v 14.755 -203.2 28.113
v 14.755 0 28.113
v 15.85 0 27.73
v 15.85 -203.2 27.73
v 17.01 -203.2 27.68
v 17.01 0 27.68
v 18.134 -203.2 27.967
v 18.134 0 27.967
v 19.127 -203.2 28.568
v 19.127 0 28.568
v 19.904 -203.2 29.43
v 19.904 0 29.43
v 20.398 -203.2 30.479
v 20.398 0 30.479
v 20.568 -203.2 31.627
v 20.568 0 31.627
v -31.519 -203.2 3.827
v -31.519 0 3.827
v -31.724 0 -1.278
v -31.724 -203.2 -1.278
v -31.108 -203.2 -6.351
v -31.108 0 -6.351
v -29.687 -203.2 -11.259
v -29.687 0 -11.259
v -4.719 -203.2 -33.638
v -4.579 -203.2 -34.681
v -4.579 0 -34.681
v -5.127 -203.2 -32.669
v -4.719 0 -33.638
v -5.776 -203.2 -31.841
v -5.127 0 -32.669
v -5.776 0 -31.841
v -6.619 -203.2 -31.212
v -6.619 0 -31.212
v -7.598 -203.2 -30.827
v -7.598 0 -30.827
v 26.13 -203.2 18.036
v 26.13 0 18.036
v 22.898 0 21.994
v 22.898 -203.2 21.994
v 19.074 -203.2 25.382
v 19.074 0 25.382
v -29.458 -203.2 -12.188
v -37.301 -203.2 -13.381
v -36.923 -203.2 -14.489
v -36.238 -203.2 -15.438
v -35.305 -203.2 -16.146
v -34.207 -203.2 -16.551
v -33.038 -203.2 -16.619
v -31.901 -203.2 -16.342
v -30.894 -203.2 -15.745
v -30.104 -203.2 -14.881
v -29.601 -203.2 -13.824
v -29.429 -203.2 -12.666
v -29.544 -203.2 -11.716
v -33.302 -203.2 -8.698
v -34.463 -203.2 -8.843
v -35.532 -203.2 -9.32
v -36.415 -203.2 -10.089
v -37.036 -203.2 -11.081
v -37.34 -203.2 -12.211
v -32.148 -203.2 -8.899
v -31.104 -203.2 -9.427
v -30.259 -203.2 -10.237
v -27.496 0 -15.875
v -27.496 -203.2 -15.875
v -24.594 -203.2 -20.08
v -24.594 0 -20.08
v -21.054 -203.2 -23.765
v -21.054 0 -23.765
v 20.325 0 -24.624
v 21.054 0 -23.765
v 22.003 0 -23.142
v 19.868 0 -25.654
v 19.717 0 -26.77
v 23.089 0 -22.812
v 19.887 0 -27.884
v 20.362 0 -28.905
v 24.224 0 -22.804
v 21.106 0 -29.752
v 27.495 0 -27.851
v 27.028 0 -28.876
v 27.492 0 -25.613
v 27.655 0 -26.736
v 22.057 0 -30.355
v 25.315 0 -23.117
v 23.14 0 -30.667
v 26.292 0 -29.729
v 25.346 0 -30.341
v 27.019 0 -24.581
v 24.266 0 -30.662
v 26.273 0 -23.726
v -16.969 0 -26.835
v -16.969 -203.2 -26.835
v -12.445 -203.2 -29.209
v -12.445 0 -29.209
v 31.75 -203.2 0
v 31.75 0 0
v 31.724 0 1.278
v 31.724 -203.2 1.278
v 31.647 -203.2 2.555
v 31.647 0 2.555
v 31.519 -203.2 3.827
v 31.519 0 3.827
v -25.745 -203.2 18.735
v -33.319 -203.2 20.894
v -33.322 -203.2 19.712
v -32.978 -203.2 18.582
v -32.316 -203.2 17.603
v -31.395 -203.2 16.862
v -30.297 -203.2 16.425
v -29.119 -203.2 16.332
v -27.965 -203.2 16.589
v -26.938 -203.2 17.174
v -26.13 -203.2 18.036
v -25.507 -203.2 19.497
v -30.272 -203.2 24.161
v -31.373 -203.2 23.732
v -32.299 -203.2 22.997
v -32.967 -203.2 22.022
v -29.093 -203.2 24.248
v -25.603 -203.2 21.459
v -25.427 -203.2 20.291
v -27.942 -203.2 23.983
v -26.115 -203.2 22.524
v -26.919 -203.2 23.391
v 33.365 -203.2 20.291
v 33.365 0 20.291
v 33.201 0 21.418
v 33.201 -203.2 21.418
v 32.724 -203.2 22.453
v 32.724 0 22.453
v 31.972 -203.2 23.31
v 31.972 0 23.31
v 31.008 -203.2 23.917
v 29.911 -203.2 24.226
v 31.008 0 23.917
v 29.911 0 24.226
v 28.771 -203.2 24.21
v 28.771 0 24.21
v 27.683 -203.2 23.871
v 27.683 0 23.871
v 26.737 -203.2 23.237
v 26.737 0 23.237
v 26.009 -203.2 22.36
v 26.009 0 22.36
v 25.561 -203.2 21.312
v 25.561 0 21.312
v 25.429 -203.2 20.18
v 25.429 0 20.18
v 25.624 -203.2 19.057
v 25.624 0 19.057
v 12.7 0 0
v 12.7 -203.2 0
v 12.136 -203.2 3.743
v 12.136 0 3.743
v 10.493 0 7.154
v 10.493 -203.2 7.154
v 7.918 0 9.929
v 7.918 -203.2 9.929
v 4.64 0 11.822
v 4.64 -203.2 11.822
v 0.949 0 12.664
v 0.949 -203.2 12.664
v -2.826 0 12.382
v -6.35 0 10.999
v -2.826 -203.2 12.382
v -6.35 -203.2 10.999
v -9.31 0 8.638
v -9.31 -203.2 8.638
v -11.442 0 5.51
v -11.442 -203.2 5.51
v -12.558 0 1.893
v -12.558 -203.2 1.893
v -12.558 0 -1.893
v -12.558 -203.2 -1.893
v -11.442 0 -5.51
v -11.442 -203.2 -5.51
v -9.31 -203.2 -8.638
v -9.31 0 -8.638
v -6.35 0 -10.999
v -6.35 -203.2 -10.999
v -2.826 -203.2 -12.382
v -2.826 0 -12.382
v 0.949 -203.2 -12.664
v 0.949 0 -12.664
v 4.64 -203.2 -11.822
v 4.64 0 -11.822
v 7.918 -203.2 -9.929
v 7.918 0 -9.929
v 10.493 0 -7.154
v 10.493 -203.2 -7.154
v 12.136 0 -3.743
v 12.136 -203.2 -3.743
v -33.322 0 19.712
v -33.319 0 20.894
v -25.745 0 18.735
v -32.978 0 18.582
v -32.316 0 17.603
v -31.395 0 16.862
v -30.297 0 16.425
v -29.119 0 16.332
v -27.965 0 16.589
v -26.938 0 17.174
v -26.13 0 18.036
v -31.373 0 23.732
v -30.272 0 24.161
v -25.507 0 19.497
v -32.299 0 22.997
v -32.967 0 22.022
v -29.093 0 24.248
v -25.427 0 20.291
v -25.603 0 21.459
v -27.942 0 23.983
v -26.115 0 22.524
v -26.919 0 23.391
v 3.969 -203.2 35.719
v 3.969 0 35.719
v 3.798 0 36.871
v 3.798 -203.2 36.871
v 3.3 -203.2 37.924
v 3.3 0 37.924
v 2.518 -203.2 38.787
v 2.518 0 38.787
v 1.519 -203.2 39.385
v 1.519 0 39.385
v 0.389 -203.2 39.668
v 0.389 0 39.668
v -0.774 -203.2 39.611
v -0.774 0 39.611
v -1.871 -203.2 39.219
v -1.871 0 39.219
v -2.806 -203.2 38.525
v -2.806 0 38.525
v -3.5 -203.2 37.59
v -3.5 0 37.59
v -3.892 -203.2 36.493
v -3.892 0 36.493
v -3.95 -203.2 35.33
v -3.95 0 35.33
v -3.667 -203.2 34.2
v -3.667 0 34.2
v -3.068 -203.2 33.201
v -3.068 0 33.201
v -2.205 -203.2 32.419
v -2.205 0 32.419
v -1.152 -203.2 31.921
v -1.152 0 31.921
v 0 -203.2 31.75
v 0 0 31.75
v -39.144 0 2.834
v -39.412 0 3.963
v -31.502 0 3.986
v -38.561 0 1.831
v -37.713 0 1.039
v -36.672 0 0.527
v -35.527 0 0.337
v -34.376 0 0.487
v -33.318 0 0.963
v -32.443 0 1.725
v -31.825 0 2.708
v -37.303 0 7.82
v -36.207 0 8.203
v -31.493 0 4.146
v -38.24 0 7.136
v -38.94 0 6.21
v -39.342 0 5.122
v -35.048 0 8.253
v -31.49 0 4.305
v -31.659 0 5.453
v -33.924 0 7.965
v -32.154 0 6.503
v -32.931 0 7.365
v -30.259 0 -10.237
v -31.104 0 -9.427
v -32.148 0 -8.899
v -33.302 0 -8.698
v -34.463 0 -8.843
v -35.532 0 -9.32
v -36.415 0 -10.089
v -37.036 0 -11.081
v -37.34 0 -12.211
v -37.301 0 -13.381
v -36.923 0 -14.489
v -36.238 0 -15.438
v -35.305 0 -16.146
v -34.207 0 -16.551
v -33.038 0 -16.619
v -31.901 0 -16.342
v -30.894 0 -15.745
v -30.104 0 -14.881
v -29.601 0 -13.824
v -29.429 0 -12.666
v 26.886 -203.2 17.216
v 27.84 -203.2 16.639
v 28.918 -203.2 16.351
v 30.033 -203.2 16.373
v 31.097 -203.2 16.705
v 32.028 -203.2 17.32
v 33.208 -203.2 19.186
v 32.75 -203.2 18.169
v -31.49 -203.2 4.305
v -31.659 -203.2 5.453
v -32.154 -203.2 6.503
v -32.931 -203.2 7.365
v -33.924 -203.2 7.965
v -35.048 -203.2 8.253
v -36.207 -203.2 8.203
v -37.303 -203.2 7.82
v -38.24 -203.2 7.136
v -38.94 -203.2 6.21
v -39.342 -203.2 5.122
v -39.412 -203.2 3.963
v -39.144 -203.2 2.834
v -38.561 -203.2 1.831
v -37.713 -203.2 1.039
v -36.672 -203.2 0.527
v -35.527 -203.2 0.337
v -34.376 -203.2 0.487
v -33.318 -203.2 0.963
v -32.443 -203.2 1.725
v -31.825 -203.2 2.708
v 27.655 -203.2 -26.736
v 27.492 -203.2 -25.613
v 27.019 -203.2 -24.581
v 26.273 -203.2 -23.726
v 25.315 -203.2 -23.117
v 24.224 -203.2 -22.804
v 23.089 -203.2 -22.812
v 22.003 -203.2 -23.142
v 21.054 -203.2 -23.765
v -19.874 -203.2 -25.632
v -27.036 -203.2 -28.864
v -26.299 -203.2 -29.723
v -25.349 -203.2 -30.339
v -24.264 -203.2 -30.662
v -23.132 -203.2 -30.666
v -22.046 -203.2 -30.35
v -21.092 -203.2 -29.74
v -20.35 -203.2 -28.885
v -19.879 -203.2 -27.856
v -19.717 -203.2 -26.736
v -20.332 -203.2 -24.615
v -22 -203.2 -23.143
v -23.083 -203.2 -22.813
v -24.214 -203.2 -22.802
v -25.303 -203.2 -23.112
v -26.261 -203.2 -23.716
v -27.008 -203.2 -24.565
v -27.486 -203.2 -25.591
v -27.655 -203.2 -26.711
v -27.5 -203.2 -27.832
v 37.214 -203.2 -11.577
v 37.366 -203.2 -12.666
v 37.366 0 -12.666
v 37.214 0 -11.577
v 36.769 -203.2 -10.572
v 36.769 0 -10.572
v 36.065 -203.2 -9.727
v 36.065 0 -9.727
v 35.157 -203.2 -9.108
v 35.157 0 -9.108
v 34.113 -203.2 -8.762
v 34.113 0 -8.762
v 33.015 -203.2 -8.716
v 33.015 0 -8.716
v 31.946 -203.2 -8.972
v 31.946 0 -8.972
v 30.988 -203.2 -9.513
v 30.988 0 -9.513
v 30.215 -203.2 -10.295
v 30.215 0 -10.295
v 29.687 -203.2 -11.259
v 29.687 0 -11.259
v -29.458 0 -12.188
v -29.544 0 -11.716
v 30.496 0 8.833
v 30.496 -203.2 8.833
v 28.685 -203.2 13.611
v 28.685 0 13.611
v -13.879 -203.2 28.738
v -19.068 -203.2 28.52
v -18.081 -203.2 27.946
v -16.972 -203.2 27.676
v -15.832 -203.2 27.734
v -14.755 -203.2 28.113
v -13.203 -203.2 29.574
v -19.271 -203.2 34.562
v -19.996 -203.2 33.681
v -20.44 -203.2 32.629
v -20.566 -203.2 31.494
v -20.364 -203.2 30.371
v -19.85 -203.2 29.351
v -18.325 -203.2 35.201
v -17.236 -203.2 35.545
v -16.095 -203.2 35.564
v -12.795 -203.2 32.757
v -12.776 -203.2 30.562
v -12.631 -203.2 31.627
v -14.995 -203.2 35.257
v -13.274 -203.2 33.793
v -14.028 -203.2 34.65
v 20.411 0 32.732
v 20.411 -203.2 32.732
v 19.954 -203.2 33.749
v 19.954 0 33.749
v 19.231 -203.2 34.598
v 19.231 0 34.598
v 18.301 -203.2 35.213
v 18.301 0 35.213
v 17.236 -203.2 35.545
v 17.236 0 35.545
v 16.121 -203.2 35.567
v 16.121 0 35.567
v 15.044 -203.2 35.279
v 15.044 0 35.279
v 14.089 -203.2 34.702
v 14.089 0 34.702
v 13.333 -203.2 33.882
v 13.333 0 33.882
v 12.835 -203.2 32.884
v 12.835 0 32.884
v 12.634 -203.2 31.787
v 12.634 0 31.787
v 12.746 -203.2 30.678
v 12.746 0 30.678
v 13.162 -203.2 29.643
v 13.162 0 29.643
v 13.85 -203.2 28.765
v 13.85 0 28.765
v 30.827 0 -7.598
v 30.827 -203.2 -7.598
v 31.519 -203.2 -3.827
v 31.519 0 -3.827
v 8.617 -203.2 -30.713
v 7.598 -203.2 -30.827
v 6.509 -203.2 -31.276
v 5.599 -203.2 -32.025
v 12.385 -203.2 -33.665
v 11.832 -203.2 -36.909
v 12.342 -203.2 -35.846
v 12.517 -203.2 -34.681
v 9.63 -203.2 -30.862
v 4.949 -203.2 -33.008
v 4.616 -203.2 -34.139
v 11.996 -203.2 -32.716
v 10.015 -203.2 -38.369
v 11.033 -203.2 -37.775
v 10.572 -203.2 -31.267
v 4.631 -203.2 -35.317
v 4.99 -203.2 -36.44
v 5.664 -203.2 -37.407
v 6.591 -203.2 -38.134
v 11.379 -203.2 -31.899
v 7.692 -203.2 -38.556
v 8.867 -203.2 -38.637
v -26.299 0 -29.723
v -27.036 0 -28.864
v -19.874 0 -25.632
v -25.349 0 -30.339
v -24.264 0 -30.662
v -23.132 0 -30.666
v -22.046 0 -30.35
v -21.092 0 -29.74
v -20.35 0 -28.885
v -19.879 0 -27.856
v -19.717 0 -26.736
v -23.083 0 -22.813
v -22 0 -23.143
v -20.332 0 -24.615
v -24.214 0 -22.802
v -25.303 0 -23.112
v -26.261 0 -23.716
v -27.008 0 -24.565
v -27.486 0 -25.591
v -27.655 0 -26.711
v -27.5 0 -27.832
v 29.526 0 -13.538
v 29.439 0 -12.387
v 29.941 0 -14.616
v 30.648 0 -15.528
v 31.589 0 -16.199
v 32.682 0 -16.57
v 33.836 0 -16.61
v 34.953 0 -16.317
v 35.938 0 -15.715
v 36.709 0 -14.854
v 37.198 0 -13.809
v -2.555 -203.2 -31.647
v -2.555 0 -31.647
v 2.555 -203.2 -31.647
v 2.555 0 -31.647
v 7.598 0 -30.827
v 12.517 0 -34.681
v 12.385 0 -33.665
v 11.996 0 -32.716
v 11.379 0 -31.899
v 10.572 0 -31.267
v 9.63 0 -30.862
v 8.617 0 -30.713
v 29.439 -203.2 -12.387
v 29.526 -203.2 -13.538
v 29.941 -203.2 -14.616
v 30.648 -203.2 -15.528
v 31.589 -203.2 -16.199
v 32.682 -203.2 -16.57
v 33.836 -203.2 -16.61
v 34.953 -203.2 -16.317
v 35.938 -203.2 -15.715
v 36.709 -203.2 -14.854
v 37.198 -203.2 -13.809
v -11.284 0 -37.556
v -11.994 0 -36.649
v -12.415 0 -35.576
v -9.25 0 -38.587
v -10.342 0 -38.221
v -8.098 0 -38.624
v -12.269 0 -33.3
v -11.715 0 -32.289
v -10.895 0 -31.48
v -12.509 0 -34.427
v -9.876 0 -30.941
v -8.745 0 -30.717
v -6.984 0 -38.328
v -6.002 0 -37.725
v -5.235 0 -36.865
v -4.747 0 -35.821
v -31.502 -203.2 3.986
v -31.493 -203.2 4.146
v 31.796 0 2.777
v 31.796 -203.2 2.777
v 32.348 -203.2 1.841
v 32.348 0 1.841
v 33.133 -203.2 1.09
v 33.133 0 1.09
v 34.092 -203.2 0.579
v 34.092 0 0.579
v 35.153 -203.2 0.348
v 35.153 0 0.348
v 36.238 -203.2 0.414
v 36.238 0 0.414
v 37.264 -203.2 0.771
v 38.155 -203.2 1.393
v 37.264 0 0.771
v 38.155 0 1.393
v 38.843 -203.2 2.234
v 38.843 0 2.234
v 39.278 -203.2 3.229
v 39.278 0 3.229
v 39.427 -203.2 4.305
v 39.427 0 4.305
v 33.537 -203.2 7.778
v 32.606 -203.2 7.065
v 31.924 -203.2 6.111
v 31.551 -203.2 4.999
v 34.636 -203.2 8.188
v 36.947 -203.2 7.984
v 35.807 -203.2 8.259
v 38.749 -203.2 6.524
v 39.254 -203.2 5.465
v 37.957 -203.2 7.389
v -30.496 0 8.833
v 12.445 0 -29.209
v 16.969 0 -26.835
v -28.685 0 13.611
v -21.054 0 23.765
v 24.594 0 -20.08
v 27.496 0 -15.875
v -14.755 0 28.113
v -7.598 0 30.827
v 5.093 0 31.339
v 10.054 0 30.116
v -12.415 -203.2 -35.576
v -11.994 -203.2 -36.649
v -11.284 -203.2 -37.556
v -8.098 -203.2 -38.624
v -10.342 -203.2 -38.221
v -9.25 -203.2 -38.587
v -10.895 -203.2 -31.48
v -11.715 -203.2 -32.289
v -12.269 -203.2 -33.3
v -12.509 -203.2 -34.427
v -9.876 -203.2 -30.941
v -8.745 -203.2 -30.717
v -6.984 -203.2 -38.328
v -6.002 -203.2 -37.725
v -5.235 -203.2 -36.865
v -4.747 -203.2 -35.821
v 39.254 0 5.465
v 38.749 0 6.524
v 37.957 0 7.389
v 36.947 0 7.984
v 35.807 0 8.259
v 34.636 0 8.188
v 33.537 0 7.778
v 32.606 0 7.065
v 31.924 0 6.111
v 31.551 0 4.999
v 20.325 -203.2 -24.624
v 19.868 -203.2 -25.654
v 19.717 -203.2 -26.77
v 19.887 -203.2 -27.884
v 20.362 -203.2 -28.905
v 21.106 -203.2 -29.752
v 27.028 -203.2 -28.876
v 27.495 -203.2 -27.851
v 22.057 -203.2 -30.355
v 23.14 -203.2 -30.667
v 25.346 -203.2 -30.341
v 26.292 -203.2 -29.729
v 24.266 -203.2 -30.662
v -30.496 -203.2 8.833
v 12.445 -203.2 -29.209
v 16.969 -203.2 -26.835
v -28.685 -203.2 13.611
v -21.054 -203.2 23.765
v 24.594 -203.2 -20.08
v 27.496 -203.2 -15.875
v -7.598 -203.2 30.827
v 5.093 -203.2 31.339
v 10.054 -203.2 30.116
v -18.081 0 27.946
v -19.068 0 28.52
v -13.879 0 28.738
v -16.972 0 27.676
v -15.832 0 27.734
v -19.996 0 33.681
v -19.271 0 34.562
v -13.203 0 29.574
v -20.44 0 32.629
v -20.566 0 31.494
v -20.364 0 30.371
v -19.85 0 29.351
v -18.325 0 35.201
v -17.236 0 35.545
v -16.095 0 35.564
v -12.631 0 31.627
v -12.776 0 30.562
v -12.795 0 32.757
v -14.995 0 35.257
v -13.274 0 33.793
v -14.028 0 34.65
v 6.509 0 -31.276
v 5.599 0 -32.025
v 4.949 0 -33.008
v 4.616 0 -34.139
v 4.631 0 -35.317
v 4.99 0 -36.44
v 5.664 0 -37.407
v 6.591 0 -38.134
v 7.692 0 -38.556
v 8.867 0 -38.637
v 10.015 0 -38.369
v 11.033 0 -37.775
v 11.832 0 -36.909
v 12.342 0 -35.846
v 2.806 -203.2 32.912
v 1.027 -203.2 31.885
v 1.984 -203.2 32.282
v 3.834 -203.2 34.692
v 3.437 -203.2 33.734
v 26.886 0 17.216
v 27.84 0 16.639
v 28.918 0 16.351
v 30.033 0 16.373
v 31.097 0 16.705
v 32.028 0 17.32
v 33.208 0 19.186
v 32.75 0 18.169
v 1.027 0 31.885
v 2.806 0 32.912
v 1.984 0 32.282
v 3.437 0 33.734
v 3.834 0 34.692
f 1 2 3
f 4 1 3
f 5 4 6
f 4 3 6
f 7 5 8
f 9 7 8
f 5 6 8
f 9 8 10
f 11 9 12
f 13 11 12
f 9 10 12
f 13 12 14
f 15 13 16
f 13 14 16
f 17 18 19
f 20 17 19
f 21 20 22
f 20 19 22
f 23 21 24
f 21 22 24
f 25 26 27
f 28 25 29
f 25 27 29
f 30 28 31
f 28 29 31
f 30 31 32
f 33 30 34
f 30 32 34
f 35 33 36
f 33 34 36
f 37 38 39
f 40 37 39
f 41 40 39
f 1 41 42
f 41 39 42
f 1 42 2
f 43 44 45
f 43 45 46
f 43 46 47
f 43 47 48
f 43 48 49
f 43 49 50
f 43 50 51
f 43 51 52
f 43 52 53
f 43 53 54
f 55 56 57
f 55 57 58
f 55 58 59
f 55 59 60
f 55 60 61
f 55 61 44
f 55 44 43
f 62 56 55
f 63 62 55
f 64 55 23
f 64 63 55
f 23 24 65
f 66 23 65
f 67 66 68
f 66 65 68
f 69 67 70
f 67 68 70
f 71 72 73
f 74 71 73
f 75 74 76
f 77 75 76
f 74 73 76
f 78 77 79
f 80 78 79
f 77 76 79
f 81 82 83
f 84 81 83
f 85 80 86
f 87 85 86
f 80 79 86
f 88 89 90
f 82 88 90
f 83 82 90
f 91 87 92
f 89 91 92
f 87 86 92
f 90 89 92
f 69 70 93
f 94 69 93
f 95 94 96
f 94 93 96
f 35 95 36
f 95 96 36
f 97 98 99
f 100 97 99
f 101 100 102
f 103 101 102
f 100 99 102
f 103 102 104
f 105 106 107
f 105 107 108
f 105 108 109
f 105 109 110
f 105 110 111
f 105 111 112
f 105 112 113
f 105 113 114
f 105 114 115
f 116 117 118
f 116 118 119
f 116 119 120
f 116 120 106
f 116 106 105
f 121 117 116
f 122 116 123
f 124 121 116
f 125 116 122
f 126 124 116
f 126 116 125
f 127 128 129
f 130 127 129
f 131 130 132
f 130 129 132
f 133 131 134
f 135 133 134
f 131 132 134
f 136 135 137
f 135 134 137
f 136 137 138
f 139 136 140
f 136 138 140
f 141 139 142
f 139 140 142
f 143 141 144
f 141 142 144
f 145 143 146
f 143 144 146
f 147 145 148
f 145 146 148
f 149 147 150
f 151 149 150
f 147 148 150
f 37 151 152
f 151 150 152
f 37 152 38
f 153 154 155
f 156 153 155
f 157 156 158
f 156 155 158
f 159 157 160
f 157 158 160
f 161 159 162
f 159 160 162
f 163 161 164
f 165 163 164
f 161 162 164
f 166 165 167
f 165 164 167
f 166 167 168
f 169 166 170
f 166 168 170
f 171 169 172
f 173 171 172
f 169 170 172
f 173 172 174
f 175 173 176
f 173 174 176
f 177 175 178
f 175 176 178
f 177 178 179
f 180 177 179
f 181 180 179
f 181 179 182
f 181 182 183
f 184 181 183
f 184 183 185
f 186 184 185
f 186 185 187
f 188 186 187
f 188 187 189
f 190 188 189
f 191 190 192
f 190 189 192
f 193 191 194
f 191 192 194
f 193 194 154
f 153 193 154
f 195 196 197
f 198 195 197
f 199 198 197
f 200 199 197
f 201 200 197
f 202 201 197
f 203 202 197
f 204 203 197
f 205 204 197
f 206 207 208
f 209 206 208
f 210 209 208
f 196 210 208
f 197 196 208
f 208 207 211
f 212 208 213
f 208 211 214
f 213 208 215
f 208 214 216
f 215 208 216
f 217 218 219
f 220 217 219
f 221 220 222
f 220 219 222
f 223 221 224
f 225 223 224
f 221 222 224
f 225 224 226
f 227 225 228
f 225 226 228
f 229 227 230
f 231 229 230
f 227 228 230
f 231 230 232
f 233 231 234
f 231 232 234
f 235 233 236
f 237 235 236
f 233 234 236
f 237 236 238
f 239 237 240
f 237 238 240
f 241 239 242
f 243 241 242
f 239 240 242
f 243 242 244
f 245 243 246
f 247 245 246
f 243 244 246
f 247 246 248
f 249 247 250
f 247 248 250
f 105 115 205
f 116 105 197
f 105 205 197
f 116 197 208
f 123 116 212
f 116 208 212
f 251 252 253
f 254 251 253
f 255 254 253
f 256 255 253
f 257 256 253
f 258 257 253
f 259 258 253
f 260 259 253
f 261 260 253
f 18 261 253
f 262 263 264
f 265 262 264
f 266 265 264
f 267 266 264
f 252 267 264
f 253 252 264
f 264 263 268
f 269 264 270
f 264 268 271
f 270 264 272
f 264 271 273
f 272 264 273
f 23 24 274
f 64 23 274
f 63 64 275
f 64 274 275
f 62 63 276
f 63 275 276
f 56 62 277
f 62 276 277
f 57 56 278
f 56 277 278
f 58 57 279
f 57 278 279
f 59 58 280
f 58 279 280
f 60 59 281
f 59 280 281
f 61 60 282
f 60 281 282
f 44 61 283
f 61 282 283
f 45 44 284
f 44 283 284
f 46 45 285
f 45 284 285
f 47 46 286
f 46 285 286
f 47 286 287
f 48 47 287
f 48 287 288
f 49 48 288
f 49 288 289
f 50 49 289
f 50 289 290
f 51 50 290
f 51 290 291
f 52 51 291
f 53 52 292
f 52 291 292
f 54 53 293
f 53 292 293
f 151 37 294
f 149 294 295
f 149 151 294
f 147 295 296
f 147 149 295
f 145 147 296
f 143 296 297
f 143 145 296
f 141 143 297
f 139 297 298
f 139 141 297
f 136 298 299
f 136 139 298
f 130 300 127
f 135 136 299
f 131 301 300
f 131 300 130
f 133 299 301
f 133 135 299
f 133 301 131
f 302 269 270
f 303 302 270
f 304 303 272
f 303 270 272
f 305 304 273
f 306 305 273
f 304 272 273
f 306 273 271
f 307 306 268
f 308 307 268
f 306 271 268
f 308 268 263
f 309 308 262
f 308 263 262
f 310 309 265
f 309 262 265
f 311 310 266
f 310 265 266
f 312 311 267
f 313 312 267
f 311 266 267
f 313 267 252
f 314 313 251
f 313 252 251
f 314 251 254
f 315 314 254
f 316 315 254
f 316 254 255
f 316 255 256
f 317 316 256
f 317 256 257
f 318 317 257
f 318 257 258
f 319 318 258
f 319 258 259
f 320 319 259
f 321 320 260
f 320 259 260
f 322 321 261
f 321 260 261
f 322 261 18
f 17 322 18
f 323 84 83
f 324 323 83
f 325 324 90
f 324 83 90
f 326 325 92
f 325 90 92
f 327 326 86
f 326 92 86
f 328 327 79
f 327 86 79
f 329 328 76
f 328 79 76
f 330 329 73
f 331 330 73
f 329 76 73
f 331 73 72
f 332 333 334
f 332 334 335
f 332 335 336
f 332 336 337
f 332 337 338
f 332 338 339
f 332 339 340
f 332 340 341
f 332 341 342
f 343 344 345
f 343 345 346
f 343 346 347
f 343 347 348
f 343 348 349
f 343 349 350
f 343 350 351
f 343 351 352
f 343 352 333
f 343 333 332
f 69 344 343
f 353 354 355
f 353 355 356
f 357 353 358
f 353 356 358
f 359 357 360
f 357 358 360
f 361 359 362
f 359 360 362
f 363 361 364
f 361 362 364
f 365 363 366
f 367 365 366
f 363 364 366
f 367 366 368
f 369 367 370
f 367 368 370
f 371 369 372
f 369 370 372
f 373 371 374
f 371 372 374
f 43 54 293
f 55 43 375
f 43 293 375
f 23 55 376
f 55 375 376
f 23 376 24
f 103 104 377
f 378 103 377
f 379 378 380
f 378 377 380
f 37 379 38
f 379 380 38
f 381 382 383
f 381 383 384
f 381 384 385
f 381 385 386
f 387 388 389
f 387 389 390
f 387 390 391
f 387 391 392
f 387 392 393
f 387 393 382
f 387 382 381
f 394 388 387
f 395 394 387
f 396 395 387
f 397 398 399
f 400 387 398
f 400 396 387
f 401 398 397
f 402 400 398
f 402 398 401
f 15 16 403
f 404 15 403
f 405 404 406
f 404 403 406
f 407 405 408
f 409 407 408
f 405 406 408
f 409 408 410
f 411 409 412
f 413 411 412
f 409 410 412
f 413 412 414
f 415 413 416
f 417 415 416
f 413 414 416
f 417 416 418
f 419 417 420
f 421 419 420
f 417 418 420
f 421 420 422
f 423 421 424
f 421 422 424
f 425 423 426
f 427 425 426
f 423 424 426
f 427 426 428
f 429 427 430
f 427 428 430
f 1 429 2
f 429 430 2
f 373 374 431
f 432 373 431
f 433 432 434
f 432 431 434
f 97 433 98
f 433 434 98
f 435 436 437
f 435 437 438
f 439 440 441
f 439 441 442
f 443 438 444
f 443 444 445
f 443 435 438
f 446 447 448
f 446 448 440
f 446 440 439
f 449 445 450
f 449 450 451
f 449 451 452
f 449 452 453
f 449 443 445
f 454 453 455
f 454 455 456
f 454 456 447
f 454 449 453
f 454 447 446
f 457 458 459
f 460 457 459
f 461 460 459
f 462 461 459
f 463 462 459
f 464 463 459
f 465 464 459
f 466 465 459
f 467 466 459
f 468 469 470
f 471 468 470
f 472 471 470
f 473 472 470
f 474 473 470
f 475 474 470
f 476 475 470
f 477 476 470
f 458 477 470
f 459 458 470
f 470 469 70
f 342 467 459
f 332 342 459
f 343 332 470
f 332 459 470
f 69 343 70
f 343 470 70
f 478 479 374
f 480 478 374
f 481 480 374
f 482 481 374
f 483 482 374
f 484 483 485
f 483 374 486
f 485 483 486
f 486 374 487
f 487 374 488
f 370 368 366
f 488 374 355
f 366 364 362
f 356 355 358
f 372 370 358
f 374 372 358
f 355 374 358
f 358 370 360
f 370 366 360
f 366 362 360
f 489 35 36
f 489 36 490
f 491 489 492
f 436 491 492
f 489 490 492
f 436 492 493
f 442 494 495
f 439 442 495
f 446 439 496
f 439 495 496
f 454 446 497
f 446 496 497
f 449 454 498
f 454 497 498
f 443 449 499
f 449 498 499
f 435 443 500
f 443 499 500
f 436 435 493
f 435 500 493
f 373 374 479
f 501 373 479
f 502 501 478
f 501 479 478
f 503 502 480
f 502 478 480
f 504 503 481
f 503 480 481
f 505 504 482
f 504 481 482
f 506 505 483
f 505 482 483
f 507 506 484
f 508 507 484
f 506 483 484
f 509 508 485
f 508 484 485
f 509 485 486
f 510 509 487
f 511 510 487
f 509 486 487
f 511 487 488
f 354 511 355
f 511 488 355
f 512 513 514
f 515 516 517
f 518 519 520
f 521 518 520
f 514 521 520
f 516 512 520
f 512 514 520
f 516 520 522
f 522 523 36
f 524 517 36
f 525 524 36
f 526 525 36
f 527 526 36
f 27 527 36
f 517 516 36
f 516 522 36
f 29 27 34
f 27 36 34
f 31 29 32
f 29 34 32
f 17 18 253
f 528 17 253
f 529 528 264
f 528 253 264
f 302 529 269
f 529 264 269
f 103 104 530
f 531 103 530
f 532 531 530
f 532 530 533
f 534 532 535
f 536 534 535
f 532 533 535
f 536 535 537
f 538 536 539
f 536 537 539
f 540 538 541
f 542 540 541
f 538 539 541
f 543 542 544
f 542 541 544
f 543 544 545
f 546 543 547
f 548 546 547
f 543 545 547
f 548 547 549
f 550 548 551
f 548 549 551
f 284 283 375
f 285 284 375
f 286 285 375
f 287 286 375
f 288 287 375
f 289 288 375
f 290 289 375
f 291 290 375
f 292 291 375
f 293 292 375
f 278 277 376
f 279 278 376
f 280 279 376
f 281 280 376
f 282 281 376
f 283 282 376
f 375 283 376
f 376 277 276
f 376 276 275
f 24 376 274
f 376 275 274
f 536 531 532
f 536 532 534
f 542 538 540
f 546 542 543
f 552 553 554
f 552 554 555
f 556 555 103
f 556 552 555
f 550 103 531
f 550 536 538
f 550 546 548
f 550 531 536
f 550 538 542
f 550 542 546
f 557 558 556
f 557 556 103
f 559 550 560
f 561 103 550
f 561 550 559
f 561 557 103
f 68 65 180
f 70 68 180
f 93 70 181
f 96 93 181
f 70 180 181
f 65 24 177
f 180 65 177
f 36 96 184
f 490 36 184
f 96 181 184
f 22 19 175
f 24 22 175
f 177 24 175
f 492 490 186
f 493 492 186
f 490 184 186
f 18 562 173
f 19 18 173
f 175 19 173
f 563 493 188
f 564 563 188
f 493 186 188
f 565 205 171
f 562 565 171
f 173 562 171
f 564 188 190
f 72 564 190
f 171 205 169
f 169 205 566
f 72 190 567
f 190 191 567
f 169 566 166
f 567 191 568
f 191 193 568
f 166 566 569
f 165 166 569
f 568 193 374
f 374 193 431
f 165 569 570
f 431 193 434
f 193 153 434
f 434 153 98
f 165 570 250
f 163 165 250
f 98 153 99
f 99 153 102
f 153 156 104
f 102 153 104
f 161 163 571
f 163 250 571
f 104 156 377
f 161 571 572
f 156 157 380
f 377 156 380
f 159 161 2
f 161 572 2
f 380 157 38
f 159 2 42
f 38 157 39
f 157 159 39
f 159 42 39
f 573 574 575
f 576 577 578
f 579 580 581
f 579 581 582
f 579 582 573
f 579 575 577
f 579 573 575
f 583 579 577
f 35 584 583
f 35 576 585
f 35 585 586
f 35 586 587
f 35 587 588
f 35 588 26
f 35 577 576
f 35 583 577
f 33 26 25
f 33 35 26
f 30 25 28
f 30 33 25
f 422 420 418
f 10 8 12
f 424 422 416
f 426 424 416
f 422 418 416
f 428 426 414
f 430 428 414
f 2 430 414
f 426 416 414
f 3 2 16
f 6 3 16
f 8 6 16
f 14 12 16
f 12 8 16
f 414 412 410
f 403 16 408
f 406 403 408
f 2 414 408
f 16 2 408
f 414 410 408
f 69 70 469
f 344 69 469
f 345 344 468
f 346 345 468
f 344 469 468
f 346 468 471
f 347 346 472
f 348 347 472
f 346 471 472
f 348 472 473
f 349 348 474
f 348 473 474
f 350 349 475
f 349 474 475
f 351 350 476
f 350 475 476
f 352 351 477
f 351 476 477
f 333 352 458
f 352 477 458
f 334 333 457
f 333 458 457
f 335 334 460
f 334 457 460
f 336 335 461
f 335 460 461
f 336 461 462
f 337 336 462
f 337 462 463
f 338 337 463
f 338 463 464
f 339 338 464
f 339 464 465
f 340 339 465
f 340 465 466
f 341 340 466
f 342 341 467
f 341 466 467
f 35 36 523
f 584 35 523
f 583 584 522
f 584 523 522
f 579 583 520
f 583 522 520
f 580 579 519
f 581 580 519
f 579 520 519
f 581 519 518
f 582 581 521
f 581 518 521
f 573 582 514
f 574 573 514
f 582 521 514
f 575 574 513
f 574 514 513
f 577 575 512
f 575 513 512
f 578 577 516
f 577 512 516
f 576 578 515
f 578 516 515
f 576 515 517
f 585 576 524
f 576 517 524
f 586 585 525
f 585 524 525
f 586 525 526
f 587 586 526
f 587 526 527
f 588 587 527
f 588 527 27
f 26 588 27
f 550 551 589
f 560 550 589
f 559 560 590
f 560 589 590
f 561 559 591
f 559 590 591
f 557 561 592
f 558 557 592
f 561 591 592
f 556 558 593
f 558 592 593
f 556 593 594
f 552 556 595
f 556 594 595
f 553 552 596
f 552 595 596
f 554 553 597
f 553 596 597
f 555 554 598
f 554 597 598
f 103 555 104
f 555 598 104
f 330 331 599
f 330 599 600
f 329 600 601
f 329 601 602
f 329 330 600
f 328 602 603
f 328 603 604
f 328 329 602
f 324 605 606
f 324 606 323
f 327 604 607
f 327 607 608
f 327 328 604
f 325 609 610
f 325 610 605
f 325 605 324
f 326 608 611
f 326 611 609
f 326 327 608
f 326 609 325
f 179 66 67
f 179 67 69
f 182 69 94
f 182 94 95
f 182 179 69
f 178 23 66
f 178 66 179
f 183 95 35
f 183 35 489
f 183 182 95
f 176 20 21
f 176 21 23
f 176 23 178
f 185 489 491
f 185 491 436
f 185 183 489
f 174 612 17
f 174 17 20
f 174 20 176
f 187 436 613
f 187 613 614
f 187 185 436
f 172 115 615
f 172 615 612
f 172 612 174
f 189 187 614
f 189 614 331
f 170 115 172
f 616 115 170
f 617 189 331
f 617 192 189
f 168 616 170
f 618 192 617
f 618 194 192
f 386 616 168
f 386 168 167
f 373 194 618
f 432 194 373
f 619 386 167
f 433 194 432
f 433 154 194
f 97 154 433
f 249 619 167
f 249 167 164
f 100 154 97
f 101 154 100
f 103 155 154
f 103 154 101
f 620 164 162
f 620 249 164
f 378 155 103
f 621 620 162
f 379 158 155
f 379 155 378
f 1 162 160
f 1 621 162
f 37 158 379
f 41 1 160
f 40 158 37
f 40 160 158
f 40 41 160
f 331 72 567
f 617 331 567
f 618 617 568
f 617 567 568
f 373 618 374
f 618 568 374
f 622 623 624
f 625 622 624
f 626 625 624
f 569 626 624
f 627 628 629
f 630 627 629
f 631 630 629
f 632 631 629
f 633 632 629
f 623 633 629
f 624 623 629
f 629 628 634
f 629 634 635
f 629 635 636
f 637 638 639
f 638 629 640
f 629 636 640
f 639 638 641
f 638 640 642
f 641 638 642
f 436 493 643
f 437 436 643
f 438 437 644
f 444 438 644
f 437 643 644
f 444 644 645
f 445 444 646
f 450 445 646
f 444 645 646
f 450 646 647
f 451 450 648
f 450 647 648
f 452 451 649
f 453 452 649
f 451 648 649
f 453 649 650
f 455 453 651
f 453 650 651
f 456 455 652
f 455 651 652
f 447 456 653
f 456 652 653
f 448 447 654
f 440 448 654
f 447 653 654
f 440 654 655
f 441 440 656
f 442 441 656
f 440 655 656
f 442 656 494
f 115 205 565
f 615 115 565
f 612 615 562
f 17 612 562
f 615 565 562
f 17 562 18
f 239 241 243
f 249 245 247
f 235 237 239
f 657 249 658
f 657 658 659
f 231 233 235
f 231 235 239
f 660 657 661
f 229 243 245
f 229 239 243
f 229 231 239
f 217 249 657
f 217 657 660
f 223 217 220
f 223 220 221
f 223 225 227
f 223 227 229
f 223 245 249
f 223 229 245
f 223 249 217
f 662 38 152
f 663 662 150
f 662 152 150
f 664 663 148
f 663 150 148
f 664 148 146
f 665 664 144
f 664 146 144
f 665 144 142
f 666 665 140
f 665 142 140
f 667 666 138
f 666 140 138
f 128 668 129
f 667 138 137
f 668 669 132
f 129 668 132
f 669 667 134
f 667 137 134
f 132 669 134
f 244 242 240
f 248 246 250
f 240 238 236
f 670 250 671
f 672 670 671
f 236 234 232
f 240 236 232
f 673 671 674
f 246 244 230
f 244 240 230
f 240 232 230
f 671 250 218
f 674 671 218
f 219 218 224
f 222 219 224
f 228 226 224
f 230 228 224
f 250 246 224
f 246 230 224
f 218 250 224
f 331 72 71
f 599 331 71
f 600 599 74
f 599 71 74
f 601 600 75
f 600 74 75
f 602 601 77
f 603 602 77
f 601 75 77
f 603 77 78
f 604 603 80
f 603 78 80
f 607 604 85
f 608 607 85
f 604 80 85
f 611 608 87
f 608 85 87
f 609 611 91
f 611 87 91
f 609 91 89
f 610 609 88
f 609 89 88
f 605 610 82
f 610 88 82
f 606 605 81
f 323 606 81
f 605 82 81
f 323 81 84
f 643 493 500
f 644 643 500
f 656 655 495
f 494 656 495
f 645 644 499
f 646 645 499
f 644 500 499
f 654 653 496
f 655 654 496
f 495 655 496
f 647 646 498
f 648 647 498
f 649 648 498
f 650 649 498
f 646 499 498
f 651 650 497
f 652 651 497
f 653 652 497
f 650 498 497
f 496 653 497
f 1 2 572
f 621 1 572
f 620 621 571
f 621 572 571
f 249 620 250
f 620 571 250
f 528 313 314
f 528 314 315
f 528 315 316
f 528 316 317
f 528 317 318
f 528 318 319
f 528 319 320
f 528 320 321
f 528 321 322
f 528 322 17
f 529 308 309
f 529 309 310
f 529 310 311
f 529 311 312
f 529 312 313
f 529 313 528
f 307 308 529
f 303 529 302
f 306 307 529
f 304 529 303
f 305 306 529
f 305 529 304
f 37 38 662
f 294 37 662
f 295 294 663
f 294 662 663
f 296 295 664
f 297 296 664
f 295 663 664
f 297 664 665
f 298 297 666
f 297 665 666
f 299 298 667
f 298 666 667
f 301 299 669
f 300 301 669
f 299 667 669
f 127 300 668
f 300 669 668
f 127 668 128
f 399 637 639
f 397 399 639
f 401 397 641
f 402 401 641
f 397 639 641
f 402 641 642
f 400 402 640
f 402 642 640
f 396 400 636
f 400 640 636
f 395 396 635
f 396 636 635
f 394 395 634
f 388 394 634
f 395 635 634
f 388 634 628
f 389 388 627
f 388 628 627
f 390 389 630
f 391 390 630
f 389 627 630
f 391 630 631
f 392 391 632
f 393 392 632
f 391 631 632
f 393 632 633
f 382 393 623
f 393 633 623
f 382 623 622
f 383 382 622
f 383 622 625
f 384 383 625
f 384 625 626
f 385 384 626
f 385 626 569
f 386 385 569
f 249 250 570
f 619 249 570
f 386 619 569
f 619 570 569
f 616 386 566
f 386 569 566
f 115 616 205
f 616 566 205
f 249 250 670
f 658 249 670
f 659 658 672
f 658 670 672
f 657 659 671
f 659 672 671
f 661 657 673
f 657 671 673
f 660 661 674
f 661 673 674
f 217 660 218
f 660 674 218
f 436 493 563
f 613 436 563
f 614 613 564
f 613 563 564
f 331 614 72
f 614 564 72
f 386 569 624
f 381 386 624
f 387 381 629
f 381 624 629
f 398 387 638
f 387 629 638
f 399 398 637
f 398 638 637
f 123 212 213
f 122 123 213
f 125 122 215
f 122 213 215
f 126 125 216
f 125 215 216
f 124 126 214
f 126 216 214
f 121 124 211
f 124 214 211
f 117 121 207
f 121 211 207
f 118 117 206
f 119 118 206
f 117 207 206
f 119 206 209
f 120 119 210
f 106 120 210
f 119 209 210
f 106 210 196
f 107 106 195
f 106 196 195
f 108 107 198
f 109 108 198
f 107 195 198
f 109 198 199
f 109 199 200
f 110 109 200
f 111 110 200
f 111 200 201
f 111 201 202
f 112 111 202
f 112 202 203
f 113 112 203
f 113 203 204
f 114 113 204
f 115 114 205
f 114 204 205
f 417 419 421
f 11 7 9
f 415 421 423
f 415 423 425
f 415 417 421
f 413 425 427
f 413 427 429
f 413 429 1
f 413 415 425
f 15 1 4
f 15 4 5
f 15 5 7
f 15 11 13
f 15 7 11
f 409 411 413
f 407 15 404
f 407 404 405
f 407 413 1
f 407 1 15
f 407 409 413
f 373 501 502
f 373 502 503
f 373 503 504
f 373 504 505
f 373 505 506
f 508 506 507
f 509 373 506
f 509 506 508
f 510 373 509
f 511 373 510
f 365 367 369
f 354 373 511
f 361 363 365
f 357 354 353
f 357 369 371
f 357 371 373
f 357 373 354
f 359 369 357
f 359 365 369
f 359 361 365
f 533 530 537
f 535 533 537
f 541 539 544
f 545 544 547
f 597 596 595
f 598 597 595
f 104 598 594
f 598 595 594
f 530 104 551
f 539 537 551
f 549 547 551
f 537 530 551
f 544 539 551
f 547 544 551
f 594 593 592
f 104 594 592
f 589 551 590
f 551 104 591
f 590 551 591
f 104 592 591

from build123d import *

# Parameters (mm, degrees)
F1_DEPTH = 203.2
F2_R     = 12.7
F3_DEPTH = 203.2


with BuildPart() as f1:
    # F0 (on Front) → F1 (new body)
    with BuildSketch(Plane.XZ):
        with BuildLine():
            ThreePointArc((29.6867657005, -11.2587051762), (31.2299320444, -5.7230974572), (31.75, 0))
            ThreePointArc((31.75, 0), (31.6920738515, 1.9170172122), (31.5185067722, 3.8270394371))
            ThreePointArc((31.5185067722, 3.8270394371), (29.6867657186, 11.2587051285), (26.1297376926, 18.0360557804))
            ThreePointArc((26.1297376926, 18.0360557804), (21.0541443733, 23.7652162773), (14.7549607284, 28.1132288061))
            ThreePointArc((14.7549607284, 28.1132288061), (7.5982723581, 30.8274026991), (1.69e-08, 31.75))
            ThreePointArc((1.69e-08, 31.75), (-7.5982724069, 30.8274026871), (-14.7549608473, 28.1132287437))
            ThreePointArc((-14.7549608473, 28.1132287437), (-21.0541444784, 23.7652161842), (-26.1297377758, 18.0360556599))
            ThreePointArc((-26.1297377758, 18.0360556599), (-29.6867657065, 11.2587051603), (-31.5185067463, 3.8270396499))
            ThreePointArc((-31.5185067463, 3.8270396499), (-31.51850677, -3.827039455), (-29.6867657889, -11.2587049429))
            ThreePointArc((-29.6867657889, -11.2587049429), (-26.1297378593, -18.036055539), (-21.0541445312, -23.7652161374))
            ThreePointArc((-21.0541445312, -23.7652161374), (-14.7549606638, -28.11322884), (-7.5982720631, -30.8274027718))
            ThreePointArc((-7.5982720631, -30.8274027718), (1.343e-07, -31.75), (7.598272324, -30.8274027075))
            ThreePointArc((7.598272324, -30.8274027075), (14.7549607189, -28.1132288111), (21.0541444233, -23.765216233))
            ThreePointArc((21.0541444233, -23.765216233), (26.1297377475, -18.0360557009), (29.6867657005, -11.2587051762))
        make_face()
    extrude(amount=F1_DEPTH)

    # F2 (on face) → F3 (cut)
    with BuildSketch(Plane.XZ.offset(203.2)):
        Circle(F2_R)
    extrude(amount=-F3_DEPTH, mode=Mode.SUBTRACT)


with BuildPart() as f1b:
    # F0 (on Front) → F1, piece 2 (new body)
    with BuildSketch(Plane.XZ):
        with BuildLine():
            ThreePointArc((37.3663614184, -12.6660433091), (34.1129985931, -8.7623018021), (29.6867657005, -11.2587051762))
            ThreePointArc((29.6867657005, -11.2587051762), (32.6822242437, -16.569784816), (37.3663614184, -12.6660433091))
        make_face()
    extrude(amount=F1_DEPTH)


with BuildPart() as f1c:
    # F0 (on Front) → F1, piece 3 (new body)
    with BuildSketch(Plane.XZ):
        with BuildLine():
            ThreePointArc((27.654662449, -26.7358682862), (25.3147382854, -23.1167657791), (21.0541444233, -23.765216233))
            ThreePointArc((21.0541444233, -23.765216233), (22.0570866127, -30.3549707934), (27.654662449, -26.7358682862))
        make_face()
    extrude(amount=F1_DEPTH)


with BuildPart() as f1d:
    # F0 (on Front) → F1, piece 4 (new body)
    with BuildSketch(Plane.XZ):
        with BuildLine():
            ThreePointArc((12.5168063838, -34.6808280412), (10.9956594026, -31.5566935971), (7.598272324, -30.8274027075))
            ThreePointArc((7.598272324, -30.8274027075), (6.100453365, -37.8049624853), (12.5168063838, -34.6808280412))
        make_face()
    extrude(amount=F1_DEPTH)


with BuildPart() as f1e:
    # F0 (on Front) → F1, piece 5 (new body)
    with BuildSketch(Plane.XZ):
        with BuildLine():
            ThreePointArc((-4.5793063838, -34.6808280412), (-5.4239218568, -32.2332251281), (-7.5982720631, -30.8274027718))
            ThreePointArc((-7.5982720631, -30.8274027718), (-11.6721909107, -37.1284309542), (-4.5793063838, -34.6808280412))
        make_face()
    extrude(amount=F1_DEPTH)


with BuildPart() as f1f:
    # F0 (on Front) → F1, piece 6 (new body)
    with BuildSketch(Plane.XZ):
        with BuildLine():
            ThreePointArc((-19.717162449, -26.7358682862), (-20.0668099715, -25.1070423841), (-21.0541445312, -23.7652161374))
            ThreePointArc((-21.0541445312, -23.7652161374), (-27.3050149266, -28.3646941883), (-19.717162449, -26.7358682862))
        make_face()
    extrude(amount=F1_DEPTH)


with BuildPart() as f1g:
    # F0 (on Front) → F1, piece 7 (new body)
    with BuildSketch(Plane.XZ):
        with BuildLine():
            ThreePointArc((-29.4288614184, -12.6660433091), (-29.493869934, -11.9506560117), (-29.6867657889, -11.2587049429))
            ThreePointArc((-29.6867657889, -11.2587049429), (-37.3013529028, -13.3814306064), (-29.4288614184, -12.6660433091))
        make_face()
    extrude(amount=F1_DEPTH)


with BuildPart() as f1h:
    # F0 (on Front) → F1, piece 8 (new body)
    with BuildSketch(Plane.XZ):
        with BuildLine():
            ThreePointArc((-31.4895700967, 4.3054195479), (-39.4198293291, 4.5450466835), (-31.5185067463, 3.8270396499))
            ThreePointArc((-31.5185067463, 3.8270396499), (-31.4968108643, 4.0657924123), (-31.4895700967, 4.3054195479))
        make_face()
    extrude(amount=F1_DEPTH)


with BuildPart() as f1i:
    # F0 (on Front) → F1, piece 9 (new body)
    with BuildSketch(Plane.XZ):
        with BuildLine():
            ThreePointArc((-25.4272049599, 20.2905626723), (-33.18500339, 21.4712779456), (-26.1297377758, 18.0360556599))
            ThreePointArc((-26.1297377758, 18.0360556599), (-25.6069065298, 19.109847399), (-25.4272049599, 20.2905626723))
        make_face()
    extrude(amount=F1_DEPTH)


with BuildPart() as f1j:
    # F0 (on Front) → F1, piece 10 (new body)
    with BuildSketch(Plane.XZ):
        with BuildLine():
            ThreePointArc((-12.6305808014, 31.6273824163), (-19.9957126865, 33.6805669315), (-14.7549608473, 28.1132287437))
            ThreePointArc((-14.7549608473, 28.1132287437), (-13.2029489164, 29.5741979011), (-12.6305808014, 31.6273824163))
        make_face()
    extrude(amount=F1_DEPTH)


with BuildPart() as f1k:
    # F0 (on Front) → F1, piece 11 (new body)
    with BuildSketch(Plane.XZ):
        with BuildLine():
            ThreePointArc((3.96875, 35.71875), (-2.8063300438, 38.5250800319), (1.69e-08, 31.75))
            ThreePointArc((1.69e-08, 31.75), (2.8063300438, 32.9124199681), (3.96875, 35.71875))
        make_face()
    extrude(amount=F1_DEPTH)


with BuildPart() as f1l:
    # F0 (on Front) → F1, piece 12 (new body)
    with BuildSketch(Plane.XZ):
        with BuildLine():
            ThreePointArc((20.5680808014, 31.6273824163), (14.5461463437, 35.0237643361), (14.7549607284, 28.1132288061))
            ThreePointArc((14.7549607284, 28.1132288061), (18.6525152592, 28.2310004965), (20.5680808014, 31.6273824163))
        make_face()
    extrude(amount=F1_DEPTH)


with BuildPart() as f1m:
    # F0 (on Front) → F1, piece 13 (new body)
    with BuildSketch(Plane.XZ):
        with BuildLine():
            ThreePointArc((33.3647049599, 20.2905626723), (28.2152397565, 24.0796111242), (26.1297376926, 18.0360557804))
            ThreePointArc((26.1297376926, 18.0360557804), (30.5766701633, 16.5015142204), (33.3647049599, 20.2905626723))
        make_face()
    extrude(amount=F1_DEPTH)


with BuildPart() as f1n:
    # F0 (on Front) → F1, piece 14 (new body)
    with BuildSketch(Plane.XZ):
        with BuildLine():
            ThreePointArc((39.4270700967, 4.3054195479), (35.2186928541, 8.2669287738), (31.5185067722, 3.8270394371))
            ThreePointArc((31.5185067722, 3.8270394371), (35.6979473393, 0.3439103219), (39.4270700967, 4.3054195479))
        make_face()
    extrude(amount=F1_DEPTH)


solid = Compound([f1.part, f1b.part, f1c.part, f1d.part, f1e.part, f1f.part, f1g.part, f1h.part, f1i.part, f1j.part, f1k.part, f1l.part, f1m.part, f1n.part])
